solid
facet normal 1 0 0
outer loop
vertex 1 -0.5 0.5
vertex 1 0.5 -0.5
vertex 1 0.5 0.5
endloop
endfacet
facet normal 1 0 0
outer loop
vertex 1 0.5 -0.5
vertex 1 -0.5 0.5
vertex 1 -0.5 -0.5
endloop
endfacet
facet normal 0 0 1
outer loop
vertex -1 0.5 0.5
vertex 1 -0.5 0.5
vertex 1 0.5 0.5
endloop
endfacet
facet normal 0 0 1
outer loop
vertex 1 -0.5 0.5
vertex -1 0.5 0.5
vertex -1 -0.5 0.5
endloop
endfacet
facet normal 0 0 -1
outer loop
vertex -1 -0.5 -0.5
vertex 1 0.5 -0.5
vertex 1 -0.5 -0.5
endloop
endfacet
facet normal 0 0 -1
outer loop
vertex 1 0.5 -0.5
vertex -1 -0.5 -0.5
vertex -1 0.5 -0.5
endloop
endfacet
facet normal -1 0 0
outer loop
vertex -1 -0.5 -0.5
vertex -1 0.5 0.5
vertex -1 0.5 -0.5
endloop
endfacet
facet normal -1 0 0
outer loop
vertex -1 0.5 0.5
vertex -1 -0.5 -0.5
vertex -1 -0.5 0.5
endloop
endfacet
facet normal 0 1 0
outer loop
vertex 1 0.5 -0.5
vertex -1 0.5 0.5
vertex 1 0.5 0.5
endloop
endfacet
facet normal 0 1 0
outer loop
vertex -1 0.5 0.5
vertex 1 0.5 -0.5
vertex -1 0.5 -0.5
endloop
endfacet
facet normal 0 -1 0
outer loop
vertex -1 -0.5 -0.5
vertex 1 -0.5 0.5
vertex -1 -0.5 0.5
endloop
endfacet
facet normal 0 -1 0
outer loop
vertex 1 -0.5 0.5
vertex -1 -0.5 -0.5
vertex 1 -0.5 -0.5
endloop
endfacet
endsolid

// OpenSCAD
difference(){cube([2,1,1],center=true);
color("Red")translate([rands(-3,3,1)[0],0,-0.5])resize([8,1,0.02])surface(file = "techtex.png", center = true, convexity = 5);
}
